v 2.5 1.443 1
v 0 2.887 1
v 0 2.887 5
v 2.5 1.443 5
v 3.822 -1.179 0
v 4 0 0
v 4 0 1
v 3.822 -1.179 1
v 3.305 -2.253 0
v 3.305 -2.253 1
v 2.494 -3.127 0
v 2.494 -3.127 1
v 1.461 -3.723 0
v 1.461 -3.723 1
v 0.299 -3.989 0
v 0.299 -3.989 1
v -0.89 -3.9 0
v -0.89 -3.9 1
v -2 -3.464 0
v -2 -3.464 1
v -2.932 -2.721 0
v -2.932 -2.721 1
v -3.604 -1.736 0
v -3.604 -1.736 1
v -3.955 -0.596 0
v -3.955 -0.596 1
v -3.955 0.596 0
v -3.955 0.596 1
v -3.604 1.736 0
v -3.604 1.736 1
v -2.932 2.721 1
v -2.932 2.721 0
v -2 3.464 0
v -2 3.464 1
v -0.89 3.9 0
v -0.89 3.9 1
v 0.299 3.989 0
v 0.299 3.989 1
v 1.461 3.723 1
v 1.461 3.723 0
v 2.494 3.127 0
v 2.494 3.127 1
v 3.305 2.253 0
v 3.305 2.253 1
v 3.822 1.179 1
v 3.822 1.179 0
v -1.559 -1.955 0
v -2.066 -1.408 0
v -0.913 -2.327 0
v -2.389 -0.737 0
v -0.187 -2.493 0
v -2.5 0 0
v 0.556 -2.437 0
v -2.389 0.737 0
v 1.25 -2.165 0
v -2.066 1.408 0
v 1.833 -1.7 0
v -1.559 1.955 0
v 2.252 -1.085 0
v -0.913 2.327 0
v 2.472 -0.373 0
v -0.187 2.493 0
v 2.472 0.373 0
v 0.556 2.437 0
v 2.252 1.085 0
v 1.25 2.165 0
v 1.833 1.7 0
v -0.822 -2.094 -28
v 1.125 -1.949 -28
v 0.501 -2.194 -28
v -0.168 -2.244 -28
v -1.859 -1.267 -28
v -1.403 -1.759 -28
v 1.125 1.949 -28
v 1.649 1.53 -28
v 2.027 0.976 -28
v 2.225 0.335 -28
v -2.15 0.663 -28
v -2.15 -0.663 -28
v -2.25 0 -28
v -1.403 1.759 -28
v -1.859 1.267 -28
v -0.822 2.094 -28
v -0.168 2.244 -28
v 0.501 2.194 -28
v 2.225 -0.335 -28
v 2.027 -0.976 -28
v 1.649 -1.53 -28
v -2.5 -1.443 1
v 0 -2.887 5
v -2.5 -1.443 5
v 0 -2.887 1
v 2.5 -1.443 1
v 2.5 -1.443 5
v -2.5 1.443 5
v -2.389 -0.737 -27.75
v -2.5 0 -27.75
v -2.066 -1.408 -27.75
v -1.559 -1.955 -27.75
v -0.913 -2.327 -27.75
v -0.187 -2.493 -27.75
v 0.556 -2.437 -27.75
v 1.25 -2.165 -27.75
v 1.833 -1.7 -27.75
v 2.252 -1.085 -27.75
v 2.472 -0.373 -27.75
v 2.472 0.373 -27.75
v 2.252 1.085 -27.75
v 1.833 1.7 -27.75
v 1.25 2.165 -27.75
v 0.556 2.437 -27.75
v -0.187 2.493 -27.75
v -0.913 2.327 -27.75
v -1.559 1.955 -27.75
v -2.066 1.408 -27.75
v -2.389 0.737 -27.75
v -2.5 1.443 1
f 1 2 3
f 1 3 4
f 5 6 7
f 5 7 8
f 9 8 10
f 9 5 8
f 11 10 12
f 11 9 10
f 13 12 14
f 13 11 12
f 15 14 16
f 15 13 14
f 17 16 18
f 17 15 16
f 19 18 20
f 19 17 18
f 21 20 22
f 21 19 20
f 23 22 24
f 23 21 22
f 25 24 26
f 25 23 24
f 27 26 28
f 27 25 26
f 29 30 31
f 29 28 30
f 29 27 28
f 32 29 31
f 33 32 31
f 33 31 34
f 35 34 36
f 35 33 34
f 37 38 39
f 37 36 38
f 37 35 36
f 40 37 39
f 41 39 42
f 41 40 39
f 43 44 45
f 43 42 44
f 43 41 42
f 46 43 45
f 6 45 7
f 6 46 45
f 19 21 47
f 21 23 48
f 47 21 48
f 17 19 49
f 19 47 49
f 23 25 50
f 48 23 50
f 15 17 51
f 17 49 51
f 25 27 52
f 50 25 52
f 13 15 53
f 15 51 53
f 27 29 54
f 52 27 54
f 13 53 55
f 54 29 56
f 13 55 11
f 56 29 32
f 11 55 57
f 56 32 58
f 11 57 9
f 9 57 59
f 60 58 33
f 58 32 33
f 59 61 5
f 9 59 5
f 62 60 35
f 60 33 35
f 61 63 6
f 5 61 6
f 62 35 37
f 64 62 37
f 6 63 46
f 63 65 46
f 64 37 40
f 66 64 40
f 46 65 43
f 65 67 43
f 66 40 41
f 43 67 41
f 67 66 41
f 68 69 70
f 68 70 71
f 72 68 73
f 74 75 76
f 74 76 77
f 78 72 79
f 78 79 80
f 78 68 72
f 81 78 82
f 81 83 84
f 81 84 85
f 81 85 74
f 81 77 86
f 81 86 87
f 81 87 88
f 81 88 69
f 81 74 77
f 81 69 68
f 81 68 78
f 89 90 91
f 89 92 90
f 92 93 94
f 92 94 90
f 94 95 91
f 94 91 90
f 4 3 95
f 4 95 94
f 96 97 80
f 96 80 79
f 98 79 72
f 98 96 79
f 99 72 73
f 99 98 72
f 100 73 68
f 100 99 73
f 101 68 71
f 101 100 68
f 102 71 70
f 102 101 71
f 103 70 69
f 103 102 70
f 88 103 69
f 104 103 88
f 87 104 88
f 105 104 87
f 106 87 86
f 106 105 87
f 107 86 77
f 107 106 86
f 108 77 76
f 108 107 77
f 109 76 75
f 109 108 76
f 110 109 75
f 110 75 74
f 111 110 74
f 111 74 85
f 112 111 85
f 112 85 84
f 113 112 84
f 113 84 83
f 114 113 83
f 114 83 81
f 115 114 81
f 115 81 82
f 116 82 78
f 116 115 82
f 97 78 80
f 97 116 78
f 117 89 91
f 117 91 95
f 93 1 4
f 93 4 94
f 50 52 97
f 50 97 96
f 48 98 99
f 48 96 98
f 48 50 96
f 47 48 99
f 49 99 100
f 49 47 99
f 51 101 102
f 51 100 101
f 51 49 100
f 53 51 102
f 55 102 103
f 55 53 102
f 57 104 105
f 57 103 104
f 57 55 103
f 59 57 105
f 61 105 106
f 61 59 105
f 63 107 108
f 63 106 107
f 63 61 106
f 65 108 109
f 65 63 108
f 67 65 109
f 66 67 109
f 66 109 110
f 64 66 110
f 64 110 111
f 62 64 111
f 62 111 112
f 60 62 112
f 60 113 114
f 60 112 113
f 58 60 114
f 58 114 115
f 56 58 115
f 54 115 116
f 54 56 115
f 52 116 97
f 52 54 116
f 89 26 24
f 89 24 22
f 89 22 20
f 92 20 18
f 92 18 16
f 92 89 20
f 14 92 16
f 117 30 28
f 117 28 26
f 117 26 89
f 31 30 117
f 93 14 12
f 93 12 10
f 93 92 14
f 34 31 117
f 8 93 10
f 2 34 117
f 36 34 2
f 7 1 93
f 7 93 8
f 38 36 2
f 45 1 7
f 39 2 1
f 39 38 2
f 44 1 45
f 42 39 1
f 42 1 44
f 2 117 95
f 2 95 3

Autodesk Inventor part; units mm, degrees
ref_plane "YZ Plane" through (0, 0, 0) normal (1, 0, 0) x (0, 1, 0)
ref_plane "XZ Plane" through (0, 0, 0) normal (0, 1, 0) x (-1, 0, 0)
ref_plane "XY Plane" through (0, 0, 0) normal (0, 0, 1) x (1, 0, 0)
sketch "草图1" plane through (0, 0, 0) normal (0, 0, 1) x (1, 0, 0)
  circle A0 centre (0, 0) radius 4
  dimension "d0" = 8
extrude "拉伸1" add sketch "草图1" along normal blind 1
sketch "草图2" plane through (0, 0, 1) normal (0, 0, 1) x (1, 0, 0)
  line L0 (0, -2.8868) -> (-2.5, -1.4434)
  line L1 (-2.5, -1.4434) -> (-2.5, 1.4434)
  line L2 (-2.5, 1.4434) -> (0, 2.8868)
  line L3 (0, 2.8868) -> (2.5, 1.4434)
  line L4 (2.5, 1.4434) -> (2.5, -1.4434)
  line L5 (2.5, -1.4434) -> (0, -2.8868)
  point P0 (0, 0)
  point P1 (0, 0)
  dimension "d3" = 5
extrude "拉伸2" add sketch "草图2" along normal blind 4
sketch "草图3" plane through (0, 0, 0) normal (0, 0, -1) x (-1, 0, 0)
  circle A0 centre (0, 0) radius 2.5
  dimension "d6" = 5
extrude "拉伸3" add sketch "草图3" along normal blind 28
thread "螺纹1" size "M5x0.8" class "6g" standard "ANSI Metric M Profile" full length
chamfer "倒角1" distance 0.25 angle 45 1 edges at (2.5, 0, -28)
properties part number "装填盘轴盖螺丝"
